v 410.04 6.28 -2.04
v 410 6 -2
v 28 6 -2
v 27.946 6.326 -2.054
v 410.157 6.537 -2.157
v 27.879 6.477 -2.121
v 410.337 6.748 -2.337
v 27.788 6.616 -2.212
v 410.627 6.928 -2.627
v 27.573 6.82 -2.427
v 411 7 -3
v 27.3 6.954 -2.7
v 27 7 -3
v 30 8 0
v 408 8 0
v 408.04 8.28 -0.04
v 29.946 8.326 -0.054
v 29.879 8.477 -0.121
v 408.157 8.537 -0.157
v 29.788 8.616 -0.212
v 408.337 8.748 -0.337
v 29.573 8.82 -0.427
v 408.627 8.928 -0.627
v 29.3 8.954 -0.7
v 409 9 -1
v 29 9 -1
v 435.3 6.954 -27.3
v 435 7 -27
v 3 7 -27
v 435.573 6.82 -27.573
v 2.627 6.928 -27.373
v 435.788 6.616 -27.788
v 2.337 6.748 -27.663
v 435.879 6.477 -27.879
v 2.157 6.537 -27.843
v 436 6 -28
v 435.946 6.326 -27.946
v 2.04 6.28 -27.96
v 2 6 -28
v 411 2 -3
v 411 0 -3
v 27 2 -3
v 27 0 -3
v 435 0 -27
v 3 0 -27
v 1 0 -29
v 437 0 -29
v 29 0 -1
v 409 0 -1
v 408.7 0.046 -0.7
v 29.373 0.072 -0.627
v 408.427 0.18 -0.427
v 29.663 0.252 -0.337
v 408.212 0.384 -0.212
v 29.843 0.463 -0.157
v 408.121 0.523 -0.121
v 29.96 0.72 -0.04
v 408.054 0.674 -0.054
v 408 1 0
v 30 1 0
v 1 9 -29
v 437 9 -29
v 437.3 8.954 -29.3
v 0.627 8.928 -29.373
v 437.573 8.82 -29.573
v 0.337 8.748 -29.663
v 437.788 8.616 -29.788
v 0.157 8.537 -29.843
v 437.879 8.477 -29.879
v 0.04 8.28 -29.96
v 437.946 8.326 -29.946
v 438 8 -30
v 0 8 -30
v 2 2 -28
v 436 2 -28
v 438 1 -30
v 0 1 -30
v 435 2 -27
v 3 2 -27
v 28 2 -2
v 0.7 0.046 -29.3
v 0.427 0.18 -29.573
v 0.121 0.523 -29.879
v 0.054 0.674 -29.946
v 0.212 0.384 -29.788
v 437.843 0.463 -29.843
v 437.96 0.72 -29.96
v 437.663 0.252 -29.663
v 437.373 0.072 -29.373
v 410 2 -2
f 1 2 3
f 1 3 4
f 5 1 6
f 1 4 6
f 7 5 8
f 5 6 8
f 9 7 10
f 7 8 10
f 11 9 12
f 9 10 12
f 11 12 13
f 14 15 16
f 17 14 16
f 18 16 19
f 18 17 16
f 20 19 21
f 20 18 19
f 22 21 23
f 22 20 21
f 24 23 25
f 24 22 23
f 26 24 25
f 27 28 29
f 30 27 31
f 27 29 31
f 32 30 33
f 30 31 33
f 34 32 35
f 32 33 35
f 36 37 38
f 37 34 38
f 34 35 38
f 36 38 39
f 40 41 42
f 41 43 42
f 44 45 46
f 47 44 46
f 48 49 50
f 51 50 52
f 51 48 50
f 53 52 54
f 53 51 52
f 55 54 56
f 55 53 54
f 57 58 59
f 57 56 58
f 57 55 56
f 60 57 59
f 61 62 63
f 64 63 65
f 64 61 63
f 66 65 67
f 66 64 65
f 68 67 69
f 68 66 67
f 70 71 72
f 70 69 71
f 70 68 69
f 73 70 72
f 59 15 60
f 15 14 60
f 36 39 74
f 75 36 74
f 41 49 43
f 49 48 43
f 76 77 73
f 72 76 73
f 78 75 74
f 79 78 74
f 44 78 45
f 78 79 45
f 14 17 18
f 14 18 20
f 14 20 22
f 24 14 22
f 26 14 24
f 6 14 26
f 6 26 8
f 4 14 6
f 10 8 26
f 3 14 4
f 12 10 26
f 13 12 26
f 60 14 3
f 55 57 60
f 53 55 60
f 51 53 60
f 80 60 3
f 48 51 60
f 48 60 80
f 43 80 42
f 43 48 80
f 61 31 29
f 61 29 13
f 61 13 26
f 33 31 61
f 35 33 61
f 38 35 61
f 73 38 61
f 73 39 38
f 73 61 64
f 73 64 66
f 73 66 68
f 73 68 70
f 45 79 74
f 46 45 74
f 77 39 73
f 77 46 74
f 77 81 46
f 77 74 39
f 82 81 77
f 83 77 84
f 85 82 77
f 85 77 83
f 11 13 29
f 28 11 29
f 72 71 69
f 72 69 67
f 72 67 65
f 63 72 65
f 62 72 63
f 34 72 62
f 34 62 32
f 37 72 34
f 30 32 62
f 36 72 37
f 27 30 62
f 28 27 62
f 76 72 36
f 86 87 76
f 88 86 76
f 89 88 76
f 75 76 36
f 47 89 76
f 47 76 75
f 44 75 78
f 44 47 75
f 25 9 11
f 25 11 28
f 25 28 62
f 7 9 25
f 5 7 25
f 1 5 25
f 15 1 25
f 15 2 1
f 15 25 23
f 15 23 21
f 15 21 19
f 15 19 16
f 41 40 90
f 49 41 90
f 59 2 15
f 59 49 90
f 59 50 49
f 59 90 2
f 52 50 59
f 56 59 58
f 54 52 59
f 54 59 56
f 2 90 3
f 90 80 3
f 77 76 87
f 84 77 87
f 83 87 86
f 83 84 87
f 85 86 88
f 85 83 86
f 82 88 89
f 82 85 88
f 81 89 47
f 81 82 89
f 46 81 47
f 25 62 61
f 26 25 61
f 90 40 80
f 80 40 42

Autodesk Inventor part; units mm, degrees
ref_plane "YZ Plane" through (0, 0, 0) normal (1, 0, 0) x (0, 1, 0)
ref_plane "XZ Plane" through (0, 0, 0) normal (0, 1, 0) x (-1, 0, 0)
ref_plane "XY Plane" through (0, 0, 0) normal (0, 0, 1) x (1, 0, 0)
sketch "Boceto principal" plane through (0, 0, 0) normal (1, 0, 0) x (0, 1, 0)
  line L0 (0, -1) -> (0, -3)
  line L1 (0, -3) -> (2, -3)
  line L2 (2, -3) -> (2, -2)
  line L3 (2, -2) -> (6, -2)
  line L4 (7, -3) -> (7, -27)
  line L5 (6, -28) -> (2, -28)
  line L6 (2, -28) -> (2, -27)
  line L7 (2, -27) -> (0, -27)
  line L8 (0, -27) -> (0, -29)
  line L9 (1, -30) -> (8, -30)
  line L10 (9, -29) -> (9, -1)
  line L11 (8, 0) -> (1, 0)
  arc A0 (1, 0) -> (0, -1) centre (1, -1) ccw
  arc A1 (7, -3) -> (6, -2) centre (6, -3) ccw
  arc A2 (6, -28) -> (7, -27) centre (6, -27) ccw
  arc A3 (0, -29) -> (1, -30) centre (1, -29) ccw
  arc A4 (8, -30) -> (9, -29) centre (8, -29) ccw
  arc A5 (9, -1) -> (8, 0) centre (8, -1) ccw
extrude "Extrusion1" add sketch "Boceto principal" along normal blind 438
sketch "Boceto esquinas" plane through (0, 0, 0) normal (0, 1, 0) x (-1, 0, 0)
  line L0 (0, 0) -> (-30, 0)
  line L1 (-30, 0) -> (0, -30)
  line L2 (0, -30) -> (0, 0)
  line L3 (-408, 0) -> (-438, 0)
  line L4 (-438, 0) -> (-438, -30)
  line L5 (-438, -30) -> (-408, 0)
extrude "Extrusion2" cut sketch "Boceto esquinas" along normal blind 10
properties part number "Tapa 30x30 438mm" material "PVC, Flexible"
